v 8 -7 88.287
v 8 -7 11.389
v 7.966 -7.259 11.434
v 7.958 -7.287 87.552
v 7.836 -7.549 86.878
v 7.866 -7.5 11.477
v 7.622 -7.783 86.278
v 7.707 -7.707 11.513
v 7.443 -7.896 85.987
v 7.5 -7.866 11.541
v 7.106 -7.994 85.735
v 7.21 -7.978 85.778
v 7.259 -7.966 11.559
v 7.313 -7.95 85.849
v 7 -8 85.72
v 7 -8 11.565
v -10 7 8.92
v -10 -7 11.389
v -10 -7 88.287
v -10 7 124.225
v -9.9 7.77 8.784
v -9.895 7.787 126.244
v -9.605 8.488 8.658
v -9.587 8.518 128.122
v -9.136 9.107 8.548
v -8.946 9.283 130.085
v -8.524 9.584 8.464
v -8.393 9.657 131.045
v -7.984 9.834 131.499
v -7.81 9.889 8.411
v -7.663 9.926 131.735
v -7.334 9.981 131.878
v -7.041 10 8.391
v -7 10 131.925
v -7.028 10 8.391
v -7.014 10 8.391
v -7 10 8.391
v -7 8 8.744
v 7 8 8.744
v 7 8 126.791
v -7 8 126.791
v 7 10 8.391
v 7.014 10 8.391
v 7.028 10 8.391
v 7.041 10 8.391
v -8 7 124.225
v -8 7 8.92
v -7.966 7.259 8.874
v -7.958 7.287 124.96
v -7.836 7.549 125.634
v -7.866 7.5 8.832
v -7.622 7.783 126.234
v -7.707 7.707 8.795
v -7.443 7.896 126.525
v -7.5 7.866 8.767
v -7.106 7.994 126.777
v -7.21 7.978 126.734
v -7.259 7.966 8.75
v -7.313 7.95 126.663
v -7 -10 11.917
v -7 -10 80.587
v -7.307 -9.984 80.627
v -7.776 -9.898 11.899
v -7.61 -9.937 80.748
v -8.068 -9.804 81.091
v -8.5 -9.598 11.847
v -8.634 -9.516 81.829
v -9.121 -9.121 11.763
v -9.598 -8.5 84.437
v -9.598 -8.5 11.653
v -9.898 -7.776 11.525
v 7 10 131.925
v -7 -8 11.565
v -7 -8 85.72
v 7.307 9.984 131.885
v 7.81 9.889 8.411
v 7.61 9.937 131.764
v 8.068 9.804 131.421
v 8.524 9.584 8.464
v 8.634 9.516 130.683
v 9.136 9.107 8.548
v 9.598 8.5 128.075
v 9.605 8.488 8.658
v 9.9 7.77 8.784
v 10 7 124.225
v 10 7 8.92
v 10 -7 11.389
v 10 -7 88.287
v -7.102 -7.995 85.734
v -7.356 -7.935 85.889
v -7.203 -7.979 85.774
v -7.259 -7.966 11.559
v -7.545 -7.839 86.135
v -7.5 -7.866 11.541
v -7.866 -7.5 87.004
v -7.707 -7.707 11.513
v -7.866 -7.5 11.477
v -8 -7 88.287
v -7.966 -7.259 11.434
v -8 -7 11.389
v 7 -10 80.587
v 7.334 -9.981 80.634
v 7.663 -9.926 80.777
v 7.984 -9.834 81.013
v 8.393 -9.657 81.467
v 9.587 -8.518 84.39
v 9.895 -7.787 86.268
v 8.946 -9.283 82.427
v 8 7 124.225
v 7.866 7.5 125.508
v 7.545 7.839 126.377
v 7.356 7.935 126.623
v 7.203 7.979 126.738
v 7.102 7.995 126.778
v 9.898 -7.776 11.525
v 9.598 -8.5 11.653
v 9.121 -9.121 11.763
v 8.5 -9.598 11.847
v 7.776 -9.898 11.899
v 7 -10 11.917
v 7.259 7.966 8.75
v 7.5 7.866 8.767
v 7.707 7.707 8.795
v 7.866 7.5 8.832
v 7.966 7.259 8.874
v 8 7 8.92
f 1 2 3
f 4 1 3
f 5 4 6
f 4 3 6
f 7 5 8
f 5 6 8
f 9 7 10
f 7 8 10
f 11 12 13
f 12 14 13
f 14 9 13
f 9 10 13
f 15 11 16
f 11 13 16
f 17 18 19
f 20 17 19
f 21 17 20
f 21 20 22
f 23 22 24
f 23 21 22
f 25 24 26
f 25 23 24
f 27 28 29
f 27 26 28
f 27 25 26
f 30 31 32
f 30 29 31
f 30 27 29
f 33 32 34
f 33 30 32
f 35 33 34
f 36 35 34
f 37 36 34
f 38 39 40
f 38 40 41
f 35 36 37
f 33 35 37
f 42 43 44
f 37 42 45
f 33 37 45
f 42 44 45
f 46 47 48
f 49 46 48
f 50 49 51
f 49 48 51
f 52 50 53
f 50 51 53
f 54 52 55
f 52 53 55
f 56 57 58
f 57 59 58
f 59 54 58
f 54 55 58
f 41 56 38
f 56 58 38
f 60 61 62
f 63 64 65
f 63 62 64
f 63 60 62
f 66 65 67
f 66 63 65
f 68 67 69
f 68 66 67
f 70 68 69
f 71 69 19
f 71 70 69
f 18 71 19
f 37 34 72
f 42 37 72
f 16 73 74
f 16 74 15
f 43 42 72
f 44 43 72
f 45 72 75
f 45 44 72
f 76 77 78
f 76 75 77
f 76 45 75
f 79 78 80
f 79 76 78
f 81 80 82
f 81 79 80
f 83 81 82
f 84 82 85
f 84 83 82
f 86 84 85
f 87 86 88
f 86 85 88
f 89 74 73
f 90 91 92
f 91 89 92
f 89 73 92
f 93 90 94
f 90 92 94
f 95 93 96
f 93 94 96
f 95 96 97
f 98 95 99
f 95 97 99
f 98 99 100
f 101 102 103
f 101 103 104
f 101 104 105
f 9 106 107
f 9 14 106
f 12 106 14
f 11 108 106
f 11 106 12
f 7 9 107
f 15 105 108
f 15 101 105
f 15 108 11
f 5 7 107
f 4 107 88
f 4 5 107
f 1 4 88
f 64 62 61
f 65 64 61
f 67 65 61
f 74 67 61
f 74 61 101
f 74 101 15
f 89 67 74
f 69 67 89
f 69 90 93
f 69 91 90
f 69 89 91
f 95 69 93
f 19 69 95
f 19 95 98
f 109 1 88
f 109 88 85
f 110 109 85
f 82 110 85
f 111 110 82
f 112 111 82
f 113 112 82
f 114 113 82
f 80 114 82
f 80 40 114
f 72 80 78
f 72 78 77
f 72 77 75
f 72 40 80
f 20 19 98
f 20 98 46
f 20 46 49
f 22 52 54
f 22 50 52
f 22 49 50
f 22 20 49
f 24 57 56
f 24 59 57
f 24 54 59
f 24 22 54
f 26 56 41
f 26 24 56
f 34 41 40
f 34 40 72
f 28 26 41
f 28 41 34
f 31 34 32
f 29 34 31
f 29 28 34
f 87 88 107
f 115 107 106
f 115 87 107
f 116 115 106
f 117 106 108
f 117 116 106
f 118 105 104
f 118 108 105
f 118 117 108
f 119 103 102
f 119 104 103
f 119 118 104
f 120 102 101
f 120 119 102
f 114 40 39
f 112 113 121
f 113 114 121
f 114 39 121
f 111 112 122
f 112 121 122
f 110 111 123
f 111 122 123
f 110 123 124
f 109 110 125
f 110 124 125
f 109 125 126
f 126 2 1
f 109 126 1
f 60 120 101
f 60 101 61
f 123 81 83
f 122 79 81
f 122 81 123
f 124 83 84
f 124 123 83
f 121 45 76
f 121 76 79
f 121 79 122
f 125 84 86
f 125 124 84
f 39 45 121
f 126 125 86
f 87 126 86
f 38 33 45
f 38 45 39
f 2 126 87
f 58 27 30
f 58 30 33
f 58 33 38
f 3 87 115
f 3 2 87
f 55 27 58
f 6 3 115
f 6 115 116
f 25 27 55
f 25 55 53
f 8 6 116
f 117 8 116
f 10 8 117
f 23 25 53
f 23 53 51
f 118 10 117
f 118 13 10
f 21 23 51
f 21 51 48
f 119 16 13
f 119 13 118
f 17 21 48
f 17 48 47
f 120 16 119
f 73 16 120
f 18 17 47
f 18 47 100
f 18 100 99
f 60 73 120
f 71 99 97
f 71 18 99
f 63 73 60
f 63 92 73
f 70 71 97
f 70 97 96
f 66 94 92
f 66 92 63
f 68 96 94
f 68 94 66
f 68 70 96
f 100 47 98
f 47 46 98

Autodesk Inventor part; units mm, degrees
ref_plane "Start Plane" through (0, 0, 8.391) normal (0, 0, 1) x (1, 0, 0)
ref_plane "End Plane" through (0, 0, 60) normal (0, 0, 1) x (1, 0, 0)
sketch "Sketch" plane through (0, 0, 0) normal (0, 0, 1) x (1, 0, 0)
  line L0 (-10, -7) -> (-10, 7)
  line L1 (-7, 10) -> (7, 10)
  line L2 (10, 7) -> (10, -7)
  line L3 (7, -10) -> (-7, -10)
  arc A0 (-10, -7) -> (-7, -10) centre (-7, -7) ccw
  arc A1 (-7, 10) -> (-10, 7) centre (-7, 7) ccw
  arc A2 (10, 7) -> (7, 10) centre (7, 7) ccw
  arc A3 (7, -10) -> (10, -7) centre (7, -7) ccw
  arc A4 (-7, 8) -> (-8, 7) centre (-7, 7) ccw
  line L4 (-7, 8) -> (7, 8)
  arc A5 (8, 7) -> (7, 8) centre (7, 7) ccw
  line L5 (8, 7) -> (8, -7)
  arc A6 (7, -8) -> (8, -7) centre (7, -7) ccw
  line L6 (7, -8) -> (-7, -8)
  arc A7 (-8, -7) -> (-7, -8) centre (-7, -7) ccw
  line L7 (-8, -7) -> (-8, 7)
  line L8 (0, 14.8698) -> (0, -14.8698) construction
  line L9 (-14.8698, 0) -> (14.8698, 0) construction
  dimension "d7" = 3
  dimension "d10" = 20
  dimension "d11" = 20
  dimension "d12" = 2
  dimension "d15" = 10
  dimension "d16" = 10
extrude "Body" add sketch "Sketch" along normal up to surface (51.609 mm away) from surface at 8.391
sketch "Sketch3" plane through (0, 0, 0) normal (0, 0, 1) x (1, 0, 0)
  line L0 (0, 0) -> (10, 0)
ref_plane "Work Plane3" through (0, 0, 0) normal (0, -1, 0) x (1, 0, 0)
sketch "Sketch4" plane through (0, 0, 0) normal (0, -1, 0) x (1, 0, 0)
  line L0 (-2, 8.391) -> (12, 8.391)
  line L1 (-2, 60) -> (12, 60)
  dimension "d18" = 51.609
ref_plane "Work Plane4" through (75, 8.6301, 8.6325) normal (0, -0.1736, -0.9848) x (1, 0, 0)
split "Split1" plane through (75, 8.6301, 8.6325) removes the side toward (0, -0.1736, -0.9848)
ref_plane "Work Plane6" through (7.5, 49.6586, 233.7267) normal (0, 0.9318, -0.363) x (0, -0.363, -0.9318)
sketch "Sketch6" plane through (-7, -10, 60) normal (0, 0, 1) x (1, 0, 0)
  line L0 (14, 18) -> (0, 18) projected
  arc A0 (15, 17) -> (14, 18) centre (14, 17) ccw projected
  line L1 (15, 3) -> (15, 17) projected
  arc A1 (14, 2) -> (15, 3) centre (14, 3) ccw projected
  line L2 (0, 2) -> (14, 2) projected
  arc A2 (-1, 3) -> (0, 2) centre (0, 3) ccw projected
  line L3 (-1, 17) -> (-1, 3) projected
  arc A3 (0, 18) -> (-1, 17) centre (0, 17) ccw projected
  line L4 (-3, 3) -> (-3, 17) projected
  arc A4 (-3, 3) -> (0, 0) centre (0, 3) ccw projected
  line L5 (14, 0) -> (0, 0) projected
  arc A5 (14, 0) -> (17, 3) centre (14, 3) ccw projected
  line L6 (17, 17) -> (17, 3) projected
  arc A6 (17, 17) -> (14, 20) centre (14, 17) ccw projected
  line L7 (0, 20) -> (14, 20) projected
  arc A7 (0, 20) -> (-3, 17) centre (0, 17) ccw projected
  point P0 (7, 10)
extrude "Extrusion2" add sketch "Sketch6" along normal blind 153.26
split "Split3" plane through (7.5, 49.6586, 233.7267) removes the side toward (0, -0.9318, 0.363)
equation "\"d7\" = G_IR"
equation "\"d10\" = G_H"
equation "\"d11\" = G_W"
equation "\"d12\" = G_T"
equation "\"d15\" = 0.5 * d10"
equation "\"d16\" = 0.5 * d11"
equation "\"d3\" = G_L"
equation "\"G_W\" = 20"
equation "\"G_H\" = 20"
equation "\"G_T\" = 2"
equation "\"G_IR\" = 3"
equation "\"G_L\" = d18"
equation "\"G_OFFSET_START\" = -8.391"
equation "\"G_OFFSET_END\" = 0"
equation "\"d13\" = -G_OFFSET_START"
properties part number "ISO 12633-2 - 20x20x2 - 51,61" material "Steel, Mild"
